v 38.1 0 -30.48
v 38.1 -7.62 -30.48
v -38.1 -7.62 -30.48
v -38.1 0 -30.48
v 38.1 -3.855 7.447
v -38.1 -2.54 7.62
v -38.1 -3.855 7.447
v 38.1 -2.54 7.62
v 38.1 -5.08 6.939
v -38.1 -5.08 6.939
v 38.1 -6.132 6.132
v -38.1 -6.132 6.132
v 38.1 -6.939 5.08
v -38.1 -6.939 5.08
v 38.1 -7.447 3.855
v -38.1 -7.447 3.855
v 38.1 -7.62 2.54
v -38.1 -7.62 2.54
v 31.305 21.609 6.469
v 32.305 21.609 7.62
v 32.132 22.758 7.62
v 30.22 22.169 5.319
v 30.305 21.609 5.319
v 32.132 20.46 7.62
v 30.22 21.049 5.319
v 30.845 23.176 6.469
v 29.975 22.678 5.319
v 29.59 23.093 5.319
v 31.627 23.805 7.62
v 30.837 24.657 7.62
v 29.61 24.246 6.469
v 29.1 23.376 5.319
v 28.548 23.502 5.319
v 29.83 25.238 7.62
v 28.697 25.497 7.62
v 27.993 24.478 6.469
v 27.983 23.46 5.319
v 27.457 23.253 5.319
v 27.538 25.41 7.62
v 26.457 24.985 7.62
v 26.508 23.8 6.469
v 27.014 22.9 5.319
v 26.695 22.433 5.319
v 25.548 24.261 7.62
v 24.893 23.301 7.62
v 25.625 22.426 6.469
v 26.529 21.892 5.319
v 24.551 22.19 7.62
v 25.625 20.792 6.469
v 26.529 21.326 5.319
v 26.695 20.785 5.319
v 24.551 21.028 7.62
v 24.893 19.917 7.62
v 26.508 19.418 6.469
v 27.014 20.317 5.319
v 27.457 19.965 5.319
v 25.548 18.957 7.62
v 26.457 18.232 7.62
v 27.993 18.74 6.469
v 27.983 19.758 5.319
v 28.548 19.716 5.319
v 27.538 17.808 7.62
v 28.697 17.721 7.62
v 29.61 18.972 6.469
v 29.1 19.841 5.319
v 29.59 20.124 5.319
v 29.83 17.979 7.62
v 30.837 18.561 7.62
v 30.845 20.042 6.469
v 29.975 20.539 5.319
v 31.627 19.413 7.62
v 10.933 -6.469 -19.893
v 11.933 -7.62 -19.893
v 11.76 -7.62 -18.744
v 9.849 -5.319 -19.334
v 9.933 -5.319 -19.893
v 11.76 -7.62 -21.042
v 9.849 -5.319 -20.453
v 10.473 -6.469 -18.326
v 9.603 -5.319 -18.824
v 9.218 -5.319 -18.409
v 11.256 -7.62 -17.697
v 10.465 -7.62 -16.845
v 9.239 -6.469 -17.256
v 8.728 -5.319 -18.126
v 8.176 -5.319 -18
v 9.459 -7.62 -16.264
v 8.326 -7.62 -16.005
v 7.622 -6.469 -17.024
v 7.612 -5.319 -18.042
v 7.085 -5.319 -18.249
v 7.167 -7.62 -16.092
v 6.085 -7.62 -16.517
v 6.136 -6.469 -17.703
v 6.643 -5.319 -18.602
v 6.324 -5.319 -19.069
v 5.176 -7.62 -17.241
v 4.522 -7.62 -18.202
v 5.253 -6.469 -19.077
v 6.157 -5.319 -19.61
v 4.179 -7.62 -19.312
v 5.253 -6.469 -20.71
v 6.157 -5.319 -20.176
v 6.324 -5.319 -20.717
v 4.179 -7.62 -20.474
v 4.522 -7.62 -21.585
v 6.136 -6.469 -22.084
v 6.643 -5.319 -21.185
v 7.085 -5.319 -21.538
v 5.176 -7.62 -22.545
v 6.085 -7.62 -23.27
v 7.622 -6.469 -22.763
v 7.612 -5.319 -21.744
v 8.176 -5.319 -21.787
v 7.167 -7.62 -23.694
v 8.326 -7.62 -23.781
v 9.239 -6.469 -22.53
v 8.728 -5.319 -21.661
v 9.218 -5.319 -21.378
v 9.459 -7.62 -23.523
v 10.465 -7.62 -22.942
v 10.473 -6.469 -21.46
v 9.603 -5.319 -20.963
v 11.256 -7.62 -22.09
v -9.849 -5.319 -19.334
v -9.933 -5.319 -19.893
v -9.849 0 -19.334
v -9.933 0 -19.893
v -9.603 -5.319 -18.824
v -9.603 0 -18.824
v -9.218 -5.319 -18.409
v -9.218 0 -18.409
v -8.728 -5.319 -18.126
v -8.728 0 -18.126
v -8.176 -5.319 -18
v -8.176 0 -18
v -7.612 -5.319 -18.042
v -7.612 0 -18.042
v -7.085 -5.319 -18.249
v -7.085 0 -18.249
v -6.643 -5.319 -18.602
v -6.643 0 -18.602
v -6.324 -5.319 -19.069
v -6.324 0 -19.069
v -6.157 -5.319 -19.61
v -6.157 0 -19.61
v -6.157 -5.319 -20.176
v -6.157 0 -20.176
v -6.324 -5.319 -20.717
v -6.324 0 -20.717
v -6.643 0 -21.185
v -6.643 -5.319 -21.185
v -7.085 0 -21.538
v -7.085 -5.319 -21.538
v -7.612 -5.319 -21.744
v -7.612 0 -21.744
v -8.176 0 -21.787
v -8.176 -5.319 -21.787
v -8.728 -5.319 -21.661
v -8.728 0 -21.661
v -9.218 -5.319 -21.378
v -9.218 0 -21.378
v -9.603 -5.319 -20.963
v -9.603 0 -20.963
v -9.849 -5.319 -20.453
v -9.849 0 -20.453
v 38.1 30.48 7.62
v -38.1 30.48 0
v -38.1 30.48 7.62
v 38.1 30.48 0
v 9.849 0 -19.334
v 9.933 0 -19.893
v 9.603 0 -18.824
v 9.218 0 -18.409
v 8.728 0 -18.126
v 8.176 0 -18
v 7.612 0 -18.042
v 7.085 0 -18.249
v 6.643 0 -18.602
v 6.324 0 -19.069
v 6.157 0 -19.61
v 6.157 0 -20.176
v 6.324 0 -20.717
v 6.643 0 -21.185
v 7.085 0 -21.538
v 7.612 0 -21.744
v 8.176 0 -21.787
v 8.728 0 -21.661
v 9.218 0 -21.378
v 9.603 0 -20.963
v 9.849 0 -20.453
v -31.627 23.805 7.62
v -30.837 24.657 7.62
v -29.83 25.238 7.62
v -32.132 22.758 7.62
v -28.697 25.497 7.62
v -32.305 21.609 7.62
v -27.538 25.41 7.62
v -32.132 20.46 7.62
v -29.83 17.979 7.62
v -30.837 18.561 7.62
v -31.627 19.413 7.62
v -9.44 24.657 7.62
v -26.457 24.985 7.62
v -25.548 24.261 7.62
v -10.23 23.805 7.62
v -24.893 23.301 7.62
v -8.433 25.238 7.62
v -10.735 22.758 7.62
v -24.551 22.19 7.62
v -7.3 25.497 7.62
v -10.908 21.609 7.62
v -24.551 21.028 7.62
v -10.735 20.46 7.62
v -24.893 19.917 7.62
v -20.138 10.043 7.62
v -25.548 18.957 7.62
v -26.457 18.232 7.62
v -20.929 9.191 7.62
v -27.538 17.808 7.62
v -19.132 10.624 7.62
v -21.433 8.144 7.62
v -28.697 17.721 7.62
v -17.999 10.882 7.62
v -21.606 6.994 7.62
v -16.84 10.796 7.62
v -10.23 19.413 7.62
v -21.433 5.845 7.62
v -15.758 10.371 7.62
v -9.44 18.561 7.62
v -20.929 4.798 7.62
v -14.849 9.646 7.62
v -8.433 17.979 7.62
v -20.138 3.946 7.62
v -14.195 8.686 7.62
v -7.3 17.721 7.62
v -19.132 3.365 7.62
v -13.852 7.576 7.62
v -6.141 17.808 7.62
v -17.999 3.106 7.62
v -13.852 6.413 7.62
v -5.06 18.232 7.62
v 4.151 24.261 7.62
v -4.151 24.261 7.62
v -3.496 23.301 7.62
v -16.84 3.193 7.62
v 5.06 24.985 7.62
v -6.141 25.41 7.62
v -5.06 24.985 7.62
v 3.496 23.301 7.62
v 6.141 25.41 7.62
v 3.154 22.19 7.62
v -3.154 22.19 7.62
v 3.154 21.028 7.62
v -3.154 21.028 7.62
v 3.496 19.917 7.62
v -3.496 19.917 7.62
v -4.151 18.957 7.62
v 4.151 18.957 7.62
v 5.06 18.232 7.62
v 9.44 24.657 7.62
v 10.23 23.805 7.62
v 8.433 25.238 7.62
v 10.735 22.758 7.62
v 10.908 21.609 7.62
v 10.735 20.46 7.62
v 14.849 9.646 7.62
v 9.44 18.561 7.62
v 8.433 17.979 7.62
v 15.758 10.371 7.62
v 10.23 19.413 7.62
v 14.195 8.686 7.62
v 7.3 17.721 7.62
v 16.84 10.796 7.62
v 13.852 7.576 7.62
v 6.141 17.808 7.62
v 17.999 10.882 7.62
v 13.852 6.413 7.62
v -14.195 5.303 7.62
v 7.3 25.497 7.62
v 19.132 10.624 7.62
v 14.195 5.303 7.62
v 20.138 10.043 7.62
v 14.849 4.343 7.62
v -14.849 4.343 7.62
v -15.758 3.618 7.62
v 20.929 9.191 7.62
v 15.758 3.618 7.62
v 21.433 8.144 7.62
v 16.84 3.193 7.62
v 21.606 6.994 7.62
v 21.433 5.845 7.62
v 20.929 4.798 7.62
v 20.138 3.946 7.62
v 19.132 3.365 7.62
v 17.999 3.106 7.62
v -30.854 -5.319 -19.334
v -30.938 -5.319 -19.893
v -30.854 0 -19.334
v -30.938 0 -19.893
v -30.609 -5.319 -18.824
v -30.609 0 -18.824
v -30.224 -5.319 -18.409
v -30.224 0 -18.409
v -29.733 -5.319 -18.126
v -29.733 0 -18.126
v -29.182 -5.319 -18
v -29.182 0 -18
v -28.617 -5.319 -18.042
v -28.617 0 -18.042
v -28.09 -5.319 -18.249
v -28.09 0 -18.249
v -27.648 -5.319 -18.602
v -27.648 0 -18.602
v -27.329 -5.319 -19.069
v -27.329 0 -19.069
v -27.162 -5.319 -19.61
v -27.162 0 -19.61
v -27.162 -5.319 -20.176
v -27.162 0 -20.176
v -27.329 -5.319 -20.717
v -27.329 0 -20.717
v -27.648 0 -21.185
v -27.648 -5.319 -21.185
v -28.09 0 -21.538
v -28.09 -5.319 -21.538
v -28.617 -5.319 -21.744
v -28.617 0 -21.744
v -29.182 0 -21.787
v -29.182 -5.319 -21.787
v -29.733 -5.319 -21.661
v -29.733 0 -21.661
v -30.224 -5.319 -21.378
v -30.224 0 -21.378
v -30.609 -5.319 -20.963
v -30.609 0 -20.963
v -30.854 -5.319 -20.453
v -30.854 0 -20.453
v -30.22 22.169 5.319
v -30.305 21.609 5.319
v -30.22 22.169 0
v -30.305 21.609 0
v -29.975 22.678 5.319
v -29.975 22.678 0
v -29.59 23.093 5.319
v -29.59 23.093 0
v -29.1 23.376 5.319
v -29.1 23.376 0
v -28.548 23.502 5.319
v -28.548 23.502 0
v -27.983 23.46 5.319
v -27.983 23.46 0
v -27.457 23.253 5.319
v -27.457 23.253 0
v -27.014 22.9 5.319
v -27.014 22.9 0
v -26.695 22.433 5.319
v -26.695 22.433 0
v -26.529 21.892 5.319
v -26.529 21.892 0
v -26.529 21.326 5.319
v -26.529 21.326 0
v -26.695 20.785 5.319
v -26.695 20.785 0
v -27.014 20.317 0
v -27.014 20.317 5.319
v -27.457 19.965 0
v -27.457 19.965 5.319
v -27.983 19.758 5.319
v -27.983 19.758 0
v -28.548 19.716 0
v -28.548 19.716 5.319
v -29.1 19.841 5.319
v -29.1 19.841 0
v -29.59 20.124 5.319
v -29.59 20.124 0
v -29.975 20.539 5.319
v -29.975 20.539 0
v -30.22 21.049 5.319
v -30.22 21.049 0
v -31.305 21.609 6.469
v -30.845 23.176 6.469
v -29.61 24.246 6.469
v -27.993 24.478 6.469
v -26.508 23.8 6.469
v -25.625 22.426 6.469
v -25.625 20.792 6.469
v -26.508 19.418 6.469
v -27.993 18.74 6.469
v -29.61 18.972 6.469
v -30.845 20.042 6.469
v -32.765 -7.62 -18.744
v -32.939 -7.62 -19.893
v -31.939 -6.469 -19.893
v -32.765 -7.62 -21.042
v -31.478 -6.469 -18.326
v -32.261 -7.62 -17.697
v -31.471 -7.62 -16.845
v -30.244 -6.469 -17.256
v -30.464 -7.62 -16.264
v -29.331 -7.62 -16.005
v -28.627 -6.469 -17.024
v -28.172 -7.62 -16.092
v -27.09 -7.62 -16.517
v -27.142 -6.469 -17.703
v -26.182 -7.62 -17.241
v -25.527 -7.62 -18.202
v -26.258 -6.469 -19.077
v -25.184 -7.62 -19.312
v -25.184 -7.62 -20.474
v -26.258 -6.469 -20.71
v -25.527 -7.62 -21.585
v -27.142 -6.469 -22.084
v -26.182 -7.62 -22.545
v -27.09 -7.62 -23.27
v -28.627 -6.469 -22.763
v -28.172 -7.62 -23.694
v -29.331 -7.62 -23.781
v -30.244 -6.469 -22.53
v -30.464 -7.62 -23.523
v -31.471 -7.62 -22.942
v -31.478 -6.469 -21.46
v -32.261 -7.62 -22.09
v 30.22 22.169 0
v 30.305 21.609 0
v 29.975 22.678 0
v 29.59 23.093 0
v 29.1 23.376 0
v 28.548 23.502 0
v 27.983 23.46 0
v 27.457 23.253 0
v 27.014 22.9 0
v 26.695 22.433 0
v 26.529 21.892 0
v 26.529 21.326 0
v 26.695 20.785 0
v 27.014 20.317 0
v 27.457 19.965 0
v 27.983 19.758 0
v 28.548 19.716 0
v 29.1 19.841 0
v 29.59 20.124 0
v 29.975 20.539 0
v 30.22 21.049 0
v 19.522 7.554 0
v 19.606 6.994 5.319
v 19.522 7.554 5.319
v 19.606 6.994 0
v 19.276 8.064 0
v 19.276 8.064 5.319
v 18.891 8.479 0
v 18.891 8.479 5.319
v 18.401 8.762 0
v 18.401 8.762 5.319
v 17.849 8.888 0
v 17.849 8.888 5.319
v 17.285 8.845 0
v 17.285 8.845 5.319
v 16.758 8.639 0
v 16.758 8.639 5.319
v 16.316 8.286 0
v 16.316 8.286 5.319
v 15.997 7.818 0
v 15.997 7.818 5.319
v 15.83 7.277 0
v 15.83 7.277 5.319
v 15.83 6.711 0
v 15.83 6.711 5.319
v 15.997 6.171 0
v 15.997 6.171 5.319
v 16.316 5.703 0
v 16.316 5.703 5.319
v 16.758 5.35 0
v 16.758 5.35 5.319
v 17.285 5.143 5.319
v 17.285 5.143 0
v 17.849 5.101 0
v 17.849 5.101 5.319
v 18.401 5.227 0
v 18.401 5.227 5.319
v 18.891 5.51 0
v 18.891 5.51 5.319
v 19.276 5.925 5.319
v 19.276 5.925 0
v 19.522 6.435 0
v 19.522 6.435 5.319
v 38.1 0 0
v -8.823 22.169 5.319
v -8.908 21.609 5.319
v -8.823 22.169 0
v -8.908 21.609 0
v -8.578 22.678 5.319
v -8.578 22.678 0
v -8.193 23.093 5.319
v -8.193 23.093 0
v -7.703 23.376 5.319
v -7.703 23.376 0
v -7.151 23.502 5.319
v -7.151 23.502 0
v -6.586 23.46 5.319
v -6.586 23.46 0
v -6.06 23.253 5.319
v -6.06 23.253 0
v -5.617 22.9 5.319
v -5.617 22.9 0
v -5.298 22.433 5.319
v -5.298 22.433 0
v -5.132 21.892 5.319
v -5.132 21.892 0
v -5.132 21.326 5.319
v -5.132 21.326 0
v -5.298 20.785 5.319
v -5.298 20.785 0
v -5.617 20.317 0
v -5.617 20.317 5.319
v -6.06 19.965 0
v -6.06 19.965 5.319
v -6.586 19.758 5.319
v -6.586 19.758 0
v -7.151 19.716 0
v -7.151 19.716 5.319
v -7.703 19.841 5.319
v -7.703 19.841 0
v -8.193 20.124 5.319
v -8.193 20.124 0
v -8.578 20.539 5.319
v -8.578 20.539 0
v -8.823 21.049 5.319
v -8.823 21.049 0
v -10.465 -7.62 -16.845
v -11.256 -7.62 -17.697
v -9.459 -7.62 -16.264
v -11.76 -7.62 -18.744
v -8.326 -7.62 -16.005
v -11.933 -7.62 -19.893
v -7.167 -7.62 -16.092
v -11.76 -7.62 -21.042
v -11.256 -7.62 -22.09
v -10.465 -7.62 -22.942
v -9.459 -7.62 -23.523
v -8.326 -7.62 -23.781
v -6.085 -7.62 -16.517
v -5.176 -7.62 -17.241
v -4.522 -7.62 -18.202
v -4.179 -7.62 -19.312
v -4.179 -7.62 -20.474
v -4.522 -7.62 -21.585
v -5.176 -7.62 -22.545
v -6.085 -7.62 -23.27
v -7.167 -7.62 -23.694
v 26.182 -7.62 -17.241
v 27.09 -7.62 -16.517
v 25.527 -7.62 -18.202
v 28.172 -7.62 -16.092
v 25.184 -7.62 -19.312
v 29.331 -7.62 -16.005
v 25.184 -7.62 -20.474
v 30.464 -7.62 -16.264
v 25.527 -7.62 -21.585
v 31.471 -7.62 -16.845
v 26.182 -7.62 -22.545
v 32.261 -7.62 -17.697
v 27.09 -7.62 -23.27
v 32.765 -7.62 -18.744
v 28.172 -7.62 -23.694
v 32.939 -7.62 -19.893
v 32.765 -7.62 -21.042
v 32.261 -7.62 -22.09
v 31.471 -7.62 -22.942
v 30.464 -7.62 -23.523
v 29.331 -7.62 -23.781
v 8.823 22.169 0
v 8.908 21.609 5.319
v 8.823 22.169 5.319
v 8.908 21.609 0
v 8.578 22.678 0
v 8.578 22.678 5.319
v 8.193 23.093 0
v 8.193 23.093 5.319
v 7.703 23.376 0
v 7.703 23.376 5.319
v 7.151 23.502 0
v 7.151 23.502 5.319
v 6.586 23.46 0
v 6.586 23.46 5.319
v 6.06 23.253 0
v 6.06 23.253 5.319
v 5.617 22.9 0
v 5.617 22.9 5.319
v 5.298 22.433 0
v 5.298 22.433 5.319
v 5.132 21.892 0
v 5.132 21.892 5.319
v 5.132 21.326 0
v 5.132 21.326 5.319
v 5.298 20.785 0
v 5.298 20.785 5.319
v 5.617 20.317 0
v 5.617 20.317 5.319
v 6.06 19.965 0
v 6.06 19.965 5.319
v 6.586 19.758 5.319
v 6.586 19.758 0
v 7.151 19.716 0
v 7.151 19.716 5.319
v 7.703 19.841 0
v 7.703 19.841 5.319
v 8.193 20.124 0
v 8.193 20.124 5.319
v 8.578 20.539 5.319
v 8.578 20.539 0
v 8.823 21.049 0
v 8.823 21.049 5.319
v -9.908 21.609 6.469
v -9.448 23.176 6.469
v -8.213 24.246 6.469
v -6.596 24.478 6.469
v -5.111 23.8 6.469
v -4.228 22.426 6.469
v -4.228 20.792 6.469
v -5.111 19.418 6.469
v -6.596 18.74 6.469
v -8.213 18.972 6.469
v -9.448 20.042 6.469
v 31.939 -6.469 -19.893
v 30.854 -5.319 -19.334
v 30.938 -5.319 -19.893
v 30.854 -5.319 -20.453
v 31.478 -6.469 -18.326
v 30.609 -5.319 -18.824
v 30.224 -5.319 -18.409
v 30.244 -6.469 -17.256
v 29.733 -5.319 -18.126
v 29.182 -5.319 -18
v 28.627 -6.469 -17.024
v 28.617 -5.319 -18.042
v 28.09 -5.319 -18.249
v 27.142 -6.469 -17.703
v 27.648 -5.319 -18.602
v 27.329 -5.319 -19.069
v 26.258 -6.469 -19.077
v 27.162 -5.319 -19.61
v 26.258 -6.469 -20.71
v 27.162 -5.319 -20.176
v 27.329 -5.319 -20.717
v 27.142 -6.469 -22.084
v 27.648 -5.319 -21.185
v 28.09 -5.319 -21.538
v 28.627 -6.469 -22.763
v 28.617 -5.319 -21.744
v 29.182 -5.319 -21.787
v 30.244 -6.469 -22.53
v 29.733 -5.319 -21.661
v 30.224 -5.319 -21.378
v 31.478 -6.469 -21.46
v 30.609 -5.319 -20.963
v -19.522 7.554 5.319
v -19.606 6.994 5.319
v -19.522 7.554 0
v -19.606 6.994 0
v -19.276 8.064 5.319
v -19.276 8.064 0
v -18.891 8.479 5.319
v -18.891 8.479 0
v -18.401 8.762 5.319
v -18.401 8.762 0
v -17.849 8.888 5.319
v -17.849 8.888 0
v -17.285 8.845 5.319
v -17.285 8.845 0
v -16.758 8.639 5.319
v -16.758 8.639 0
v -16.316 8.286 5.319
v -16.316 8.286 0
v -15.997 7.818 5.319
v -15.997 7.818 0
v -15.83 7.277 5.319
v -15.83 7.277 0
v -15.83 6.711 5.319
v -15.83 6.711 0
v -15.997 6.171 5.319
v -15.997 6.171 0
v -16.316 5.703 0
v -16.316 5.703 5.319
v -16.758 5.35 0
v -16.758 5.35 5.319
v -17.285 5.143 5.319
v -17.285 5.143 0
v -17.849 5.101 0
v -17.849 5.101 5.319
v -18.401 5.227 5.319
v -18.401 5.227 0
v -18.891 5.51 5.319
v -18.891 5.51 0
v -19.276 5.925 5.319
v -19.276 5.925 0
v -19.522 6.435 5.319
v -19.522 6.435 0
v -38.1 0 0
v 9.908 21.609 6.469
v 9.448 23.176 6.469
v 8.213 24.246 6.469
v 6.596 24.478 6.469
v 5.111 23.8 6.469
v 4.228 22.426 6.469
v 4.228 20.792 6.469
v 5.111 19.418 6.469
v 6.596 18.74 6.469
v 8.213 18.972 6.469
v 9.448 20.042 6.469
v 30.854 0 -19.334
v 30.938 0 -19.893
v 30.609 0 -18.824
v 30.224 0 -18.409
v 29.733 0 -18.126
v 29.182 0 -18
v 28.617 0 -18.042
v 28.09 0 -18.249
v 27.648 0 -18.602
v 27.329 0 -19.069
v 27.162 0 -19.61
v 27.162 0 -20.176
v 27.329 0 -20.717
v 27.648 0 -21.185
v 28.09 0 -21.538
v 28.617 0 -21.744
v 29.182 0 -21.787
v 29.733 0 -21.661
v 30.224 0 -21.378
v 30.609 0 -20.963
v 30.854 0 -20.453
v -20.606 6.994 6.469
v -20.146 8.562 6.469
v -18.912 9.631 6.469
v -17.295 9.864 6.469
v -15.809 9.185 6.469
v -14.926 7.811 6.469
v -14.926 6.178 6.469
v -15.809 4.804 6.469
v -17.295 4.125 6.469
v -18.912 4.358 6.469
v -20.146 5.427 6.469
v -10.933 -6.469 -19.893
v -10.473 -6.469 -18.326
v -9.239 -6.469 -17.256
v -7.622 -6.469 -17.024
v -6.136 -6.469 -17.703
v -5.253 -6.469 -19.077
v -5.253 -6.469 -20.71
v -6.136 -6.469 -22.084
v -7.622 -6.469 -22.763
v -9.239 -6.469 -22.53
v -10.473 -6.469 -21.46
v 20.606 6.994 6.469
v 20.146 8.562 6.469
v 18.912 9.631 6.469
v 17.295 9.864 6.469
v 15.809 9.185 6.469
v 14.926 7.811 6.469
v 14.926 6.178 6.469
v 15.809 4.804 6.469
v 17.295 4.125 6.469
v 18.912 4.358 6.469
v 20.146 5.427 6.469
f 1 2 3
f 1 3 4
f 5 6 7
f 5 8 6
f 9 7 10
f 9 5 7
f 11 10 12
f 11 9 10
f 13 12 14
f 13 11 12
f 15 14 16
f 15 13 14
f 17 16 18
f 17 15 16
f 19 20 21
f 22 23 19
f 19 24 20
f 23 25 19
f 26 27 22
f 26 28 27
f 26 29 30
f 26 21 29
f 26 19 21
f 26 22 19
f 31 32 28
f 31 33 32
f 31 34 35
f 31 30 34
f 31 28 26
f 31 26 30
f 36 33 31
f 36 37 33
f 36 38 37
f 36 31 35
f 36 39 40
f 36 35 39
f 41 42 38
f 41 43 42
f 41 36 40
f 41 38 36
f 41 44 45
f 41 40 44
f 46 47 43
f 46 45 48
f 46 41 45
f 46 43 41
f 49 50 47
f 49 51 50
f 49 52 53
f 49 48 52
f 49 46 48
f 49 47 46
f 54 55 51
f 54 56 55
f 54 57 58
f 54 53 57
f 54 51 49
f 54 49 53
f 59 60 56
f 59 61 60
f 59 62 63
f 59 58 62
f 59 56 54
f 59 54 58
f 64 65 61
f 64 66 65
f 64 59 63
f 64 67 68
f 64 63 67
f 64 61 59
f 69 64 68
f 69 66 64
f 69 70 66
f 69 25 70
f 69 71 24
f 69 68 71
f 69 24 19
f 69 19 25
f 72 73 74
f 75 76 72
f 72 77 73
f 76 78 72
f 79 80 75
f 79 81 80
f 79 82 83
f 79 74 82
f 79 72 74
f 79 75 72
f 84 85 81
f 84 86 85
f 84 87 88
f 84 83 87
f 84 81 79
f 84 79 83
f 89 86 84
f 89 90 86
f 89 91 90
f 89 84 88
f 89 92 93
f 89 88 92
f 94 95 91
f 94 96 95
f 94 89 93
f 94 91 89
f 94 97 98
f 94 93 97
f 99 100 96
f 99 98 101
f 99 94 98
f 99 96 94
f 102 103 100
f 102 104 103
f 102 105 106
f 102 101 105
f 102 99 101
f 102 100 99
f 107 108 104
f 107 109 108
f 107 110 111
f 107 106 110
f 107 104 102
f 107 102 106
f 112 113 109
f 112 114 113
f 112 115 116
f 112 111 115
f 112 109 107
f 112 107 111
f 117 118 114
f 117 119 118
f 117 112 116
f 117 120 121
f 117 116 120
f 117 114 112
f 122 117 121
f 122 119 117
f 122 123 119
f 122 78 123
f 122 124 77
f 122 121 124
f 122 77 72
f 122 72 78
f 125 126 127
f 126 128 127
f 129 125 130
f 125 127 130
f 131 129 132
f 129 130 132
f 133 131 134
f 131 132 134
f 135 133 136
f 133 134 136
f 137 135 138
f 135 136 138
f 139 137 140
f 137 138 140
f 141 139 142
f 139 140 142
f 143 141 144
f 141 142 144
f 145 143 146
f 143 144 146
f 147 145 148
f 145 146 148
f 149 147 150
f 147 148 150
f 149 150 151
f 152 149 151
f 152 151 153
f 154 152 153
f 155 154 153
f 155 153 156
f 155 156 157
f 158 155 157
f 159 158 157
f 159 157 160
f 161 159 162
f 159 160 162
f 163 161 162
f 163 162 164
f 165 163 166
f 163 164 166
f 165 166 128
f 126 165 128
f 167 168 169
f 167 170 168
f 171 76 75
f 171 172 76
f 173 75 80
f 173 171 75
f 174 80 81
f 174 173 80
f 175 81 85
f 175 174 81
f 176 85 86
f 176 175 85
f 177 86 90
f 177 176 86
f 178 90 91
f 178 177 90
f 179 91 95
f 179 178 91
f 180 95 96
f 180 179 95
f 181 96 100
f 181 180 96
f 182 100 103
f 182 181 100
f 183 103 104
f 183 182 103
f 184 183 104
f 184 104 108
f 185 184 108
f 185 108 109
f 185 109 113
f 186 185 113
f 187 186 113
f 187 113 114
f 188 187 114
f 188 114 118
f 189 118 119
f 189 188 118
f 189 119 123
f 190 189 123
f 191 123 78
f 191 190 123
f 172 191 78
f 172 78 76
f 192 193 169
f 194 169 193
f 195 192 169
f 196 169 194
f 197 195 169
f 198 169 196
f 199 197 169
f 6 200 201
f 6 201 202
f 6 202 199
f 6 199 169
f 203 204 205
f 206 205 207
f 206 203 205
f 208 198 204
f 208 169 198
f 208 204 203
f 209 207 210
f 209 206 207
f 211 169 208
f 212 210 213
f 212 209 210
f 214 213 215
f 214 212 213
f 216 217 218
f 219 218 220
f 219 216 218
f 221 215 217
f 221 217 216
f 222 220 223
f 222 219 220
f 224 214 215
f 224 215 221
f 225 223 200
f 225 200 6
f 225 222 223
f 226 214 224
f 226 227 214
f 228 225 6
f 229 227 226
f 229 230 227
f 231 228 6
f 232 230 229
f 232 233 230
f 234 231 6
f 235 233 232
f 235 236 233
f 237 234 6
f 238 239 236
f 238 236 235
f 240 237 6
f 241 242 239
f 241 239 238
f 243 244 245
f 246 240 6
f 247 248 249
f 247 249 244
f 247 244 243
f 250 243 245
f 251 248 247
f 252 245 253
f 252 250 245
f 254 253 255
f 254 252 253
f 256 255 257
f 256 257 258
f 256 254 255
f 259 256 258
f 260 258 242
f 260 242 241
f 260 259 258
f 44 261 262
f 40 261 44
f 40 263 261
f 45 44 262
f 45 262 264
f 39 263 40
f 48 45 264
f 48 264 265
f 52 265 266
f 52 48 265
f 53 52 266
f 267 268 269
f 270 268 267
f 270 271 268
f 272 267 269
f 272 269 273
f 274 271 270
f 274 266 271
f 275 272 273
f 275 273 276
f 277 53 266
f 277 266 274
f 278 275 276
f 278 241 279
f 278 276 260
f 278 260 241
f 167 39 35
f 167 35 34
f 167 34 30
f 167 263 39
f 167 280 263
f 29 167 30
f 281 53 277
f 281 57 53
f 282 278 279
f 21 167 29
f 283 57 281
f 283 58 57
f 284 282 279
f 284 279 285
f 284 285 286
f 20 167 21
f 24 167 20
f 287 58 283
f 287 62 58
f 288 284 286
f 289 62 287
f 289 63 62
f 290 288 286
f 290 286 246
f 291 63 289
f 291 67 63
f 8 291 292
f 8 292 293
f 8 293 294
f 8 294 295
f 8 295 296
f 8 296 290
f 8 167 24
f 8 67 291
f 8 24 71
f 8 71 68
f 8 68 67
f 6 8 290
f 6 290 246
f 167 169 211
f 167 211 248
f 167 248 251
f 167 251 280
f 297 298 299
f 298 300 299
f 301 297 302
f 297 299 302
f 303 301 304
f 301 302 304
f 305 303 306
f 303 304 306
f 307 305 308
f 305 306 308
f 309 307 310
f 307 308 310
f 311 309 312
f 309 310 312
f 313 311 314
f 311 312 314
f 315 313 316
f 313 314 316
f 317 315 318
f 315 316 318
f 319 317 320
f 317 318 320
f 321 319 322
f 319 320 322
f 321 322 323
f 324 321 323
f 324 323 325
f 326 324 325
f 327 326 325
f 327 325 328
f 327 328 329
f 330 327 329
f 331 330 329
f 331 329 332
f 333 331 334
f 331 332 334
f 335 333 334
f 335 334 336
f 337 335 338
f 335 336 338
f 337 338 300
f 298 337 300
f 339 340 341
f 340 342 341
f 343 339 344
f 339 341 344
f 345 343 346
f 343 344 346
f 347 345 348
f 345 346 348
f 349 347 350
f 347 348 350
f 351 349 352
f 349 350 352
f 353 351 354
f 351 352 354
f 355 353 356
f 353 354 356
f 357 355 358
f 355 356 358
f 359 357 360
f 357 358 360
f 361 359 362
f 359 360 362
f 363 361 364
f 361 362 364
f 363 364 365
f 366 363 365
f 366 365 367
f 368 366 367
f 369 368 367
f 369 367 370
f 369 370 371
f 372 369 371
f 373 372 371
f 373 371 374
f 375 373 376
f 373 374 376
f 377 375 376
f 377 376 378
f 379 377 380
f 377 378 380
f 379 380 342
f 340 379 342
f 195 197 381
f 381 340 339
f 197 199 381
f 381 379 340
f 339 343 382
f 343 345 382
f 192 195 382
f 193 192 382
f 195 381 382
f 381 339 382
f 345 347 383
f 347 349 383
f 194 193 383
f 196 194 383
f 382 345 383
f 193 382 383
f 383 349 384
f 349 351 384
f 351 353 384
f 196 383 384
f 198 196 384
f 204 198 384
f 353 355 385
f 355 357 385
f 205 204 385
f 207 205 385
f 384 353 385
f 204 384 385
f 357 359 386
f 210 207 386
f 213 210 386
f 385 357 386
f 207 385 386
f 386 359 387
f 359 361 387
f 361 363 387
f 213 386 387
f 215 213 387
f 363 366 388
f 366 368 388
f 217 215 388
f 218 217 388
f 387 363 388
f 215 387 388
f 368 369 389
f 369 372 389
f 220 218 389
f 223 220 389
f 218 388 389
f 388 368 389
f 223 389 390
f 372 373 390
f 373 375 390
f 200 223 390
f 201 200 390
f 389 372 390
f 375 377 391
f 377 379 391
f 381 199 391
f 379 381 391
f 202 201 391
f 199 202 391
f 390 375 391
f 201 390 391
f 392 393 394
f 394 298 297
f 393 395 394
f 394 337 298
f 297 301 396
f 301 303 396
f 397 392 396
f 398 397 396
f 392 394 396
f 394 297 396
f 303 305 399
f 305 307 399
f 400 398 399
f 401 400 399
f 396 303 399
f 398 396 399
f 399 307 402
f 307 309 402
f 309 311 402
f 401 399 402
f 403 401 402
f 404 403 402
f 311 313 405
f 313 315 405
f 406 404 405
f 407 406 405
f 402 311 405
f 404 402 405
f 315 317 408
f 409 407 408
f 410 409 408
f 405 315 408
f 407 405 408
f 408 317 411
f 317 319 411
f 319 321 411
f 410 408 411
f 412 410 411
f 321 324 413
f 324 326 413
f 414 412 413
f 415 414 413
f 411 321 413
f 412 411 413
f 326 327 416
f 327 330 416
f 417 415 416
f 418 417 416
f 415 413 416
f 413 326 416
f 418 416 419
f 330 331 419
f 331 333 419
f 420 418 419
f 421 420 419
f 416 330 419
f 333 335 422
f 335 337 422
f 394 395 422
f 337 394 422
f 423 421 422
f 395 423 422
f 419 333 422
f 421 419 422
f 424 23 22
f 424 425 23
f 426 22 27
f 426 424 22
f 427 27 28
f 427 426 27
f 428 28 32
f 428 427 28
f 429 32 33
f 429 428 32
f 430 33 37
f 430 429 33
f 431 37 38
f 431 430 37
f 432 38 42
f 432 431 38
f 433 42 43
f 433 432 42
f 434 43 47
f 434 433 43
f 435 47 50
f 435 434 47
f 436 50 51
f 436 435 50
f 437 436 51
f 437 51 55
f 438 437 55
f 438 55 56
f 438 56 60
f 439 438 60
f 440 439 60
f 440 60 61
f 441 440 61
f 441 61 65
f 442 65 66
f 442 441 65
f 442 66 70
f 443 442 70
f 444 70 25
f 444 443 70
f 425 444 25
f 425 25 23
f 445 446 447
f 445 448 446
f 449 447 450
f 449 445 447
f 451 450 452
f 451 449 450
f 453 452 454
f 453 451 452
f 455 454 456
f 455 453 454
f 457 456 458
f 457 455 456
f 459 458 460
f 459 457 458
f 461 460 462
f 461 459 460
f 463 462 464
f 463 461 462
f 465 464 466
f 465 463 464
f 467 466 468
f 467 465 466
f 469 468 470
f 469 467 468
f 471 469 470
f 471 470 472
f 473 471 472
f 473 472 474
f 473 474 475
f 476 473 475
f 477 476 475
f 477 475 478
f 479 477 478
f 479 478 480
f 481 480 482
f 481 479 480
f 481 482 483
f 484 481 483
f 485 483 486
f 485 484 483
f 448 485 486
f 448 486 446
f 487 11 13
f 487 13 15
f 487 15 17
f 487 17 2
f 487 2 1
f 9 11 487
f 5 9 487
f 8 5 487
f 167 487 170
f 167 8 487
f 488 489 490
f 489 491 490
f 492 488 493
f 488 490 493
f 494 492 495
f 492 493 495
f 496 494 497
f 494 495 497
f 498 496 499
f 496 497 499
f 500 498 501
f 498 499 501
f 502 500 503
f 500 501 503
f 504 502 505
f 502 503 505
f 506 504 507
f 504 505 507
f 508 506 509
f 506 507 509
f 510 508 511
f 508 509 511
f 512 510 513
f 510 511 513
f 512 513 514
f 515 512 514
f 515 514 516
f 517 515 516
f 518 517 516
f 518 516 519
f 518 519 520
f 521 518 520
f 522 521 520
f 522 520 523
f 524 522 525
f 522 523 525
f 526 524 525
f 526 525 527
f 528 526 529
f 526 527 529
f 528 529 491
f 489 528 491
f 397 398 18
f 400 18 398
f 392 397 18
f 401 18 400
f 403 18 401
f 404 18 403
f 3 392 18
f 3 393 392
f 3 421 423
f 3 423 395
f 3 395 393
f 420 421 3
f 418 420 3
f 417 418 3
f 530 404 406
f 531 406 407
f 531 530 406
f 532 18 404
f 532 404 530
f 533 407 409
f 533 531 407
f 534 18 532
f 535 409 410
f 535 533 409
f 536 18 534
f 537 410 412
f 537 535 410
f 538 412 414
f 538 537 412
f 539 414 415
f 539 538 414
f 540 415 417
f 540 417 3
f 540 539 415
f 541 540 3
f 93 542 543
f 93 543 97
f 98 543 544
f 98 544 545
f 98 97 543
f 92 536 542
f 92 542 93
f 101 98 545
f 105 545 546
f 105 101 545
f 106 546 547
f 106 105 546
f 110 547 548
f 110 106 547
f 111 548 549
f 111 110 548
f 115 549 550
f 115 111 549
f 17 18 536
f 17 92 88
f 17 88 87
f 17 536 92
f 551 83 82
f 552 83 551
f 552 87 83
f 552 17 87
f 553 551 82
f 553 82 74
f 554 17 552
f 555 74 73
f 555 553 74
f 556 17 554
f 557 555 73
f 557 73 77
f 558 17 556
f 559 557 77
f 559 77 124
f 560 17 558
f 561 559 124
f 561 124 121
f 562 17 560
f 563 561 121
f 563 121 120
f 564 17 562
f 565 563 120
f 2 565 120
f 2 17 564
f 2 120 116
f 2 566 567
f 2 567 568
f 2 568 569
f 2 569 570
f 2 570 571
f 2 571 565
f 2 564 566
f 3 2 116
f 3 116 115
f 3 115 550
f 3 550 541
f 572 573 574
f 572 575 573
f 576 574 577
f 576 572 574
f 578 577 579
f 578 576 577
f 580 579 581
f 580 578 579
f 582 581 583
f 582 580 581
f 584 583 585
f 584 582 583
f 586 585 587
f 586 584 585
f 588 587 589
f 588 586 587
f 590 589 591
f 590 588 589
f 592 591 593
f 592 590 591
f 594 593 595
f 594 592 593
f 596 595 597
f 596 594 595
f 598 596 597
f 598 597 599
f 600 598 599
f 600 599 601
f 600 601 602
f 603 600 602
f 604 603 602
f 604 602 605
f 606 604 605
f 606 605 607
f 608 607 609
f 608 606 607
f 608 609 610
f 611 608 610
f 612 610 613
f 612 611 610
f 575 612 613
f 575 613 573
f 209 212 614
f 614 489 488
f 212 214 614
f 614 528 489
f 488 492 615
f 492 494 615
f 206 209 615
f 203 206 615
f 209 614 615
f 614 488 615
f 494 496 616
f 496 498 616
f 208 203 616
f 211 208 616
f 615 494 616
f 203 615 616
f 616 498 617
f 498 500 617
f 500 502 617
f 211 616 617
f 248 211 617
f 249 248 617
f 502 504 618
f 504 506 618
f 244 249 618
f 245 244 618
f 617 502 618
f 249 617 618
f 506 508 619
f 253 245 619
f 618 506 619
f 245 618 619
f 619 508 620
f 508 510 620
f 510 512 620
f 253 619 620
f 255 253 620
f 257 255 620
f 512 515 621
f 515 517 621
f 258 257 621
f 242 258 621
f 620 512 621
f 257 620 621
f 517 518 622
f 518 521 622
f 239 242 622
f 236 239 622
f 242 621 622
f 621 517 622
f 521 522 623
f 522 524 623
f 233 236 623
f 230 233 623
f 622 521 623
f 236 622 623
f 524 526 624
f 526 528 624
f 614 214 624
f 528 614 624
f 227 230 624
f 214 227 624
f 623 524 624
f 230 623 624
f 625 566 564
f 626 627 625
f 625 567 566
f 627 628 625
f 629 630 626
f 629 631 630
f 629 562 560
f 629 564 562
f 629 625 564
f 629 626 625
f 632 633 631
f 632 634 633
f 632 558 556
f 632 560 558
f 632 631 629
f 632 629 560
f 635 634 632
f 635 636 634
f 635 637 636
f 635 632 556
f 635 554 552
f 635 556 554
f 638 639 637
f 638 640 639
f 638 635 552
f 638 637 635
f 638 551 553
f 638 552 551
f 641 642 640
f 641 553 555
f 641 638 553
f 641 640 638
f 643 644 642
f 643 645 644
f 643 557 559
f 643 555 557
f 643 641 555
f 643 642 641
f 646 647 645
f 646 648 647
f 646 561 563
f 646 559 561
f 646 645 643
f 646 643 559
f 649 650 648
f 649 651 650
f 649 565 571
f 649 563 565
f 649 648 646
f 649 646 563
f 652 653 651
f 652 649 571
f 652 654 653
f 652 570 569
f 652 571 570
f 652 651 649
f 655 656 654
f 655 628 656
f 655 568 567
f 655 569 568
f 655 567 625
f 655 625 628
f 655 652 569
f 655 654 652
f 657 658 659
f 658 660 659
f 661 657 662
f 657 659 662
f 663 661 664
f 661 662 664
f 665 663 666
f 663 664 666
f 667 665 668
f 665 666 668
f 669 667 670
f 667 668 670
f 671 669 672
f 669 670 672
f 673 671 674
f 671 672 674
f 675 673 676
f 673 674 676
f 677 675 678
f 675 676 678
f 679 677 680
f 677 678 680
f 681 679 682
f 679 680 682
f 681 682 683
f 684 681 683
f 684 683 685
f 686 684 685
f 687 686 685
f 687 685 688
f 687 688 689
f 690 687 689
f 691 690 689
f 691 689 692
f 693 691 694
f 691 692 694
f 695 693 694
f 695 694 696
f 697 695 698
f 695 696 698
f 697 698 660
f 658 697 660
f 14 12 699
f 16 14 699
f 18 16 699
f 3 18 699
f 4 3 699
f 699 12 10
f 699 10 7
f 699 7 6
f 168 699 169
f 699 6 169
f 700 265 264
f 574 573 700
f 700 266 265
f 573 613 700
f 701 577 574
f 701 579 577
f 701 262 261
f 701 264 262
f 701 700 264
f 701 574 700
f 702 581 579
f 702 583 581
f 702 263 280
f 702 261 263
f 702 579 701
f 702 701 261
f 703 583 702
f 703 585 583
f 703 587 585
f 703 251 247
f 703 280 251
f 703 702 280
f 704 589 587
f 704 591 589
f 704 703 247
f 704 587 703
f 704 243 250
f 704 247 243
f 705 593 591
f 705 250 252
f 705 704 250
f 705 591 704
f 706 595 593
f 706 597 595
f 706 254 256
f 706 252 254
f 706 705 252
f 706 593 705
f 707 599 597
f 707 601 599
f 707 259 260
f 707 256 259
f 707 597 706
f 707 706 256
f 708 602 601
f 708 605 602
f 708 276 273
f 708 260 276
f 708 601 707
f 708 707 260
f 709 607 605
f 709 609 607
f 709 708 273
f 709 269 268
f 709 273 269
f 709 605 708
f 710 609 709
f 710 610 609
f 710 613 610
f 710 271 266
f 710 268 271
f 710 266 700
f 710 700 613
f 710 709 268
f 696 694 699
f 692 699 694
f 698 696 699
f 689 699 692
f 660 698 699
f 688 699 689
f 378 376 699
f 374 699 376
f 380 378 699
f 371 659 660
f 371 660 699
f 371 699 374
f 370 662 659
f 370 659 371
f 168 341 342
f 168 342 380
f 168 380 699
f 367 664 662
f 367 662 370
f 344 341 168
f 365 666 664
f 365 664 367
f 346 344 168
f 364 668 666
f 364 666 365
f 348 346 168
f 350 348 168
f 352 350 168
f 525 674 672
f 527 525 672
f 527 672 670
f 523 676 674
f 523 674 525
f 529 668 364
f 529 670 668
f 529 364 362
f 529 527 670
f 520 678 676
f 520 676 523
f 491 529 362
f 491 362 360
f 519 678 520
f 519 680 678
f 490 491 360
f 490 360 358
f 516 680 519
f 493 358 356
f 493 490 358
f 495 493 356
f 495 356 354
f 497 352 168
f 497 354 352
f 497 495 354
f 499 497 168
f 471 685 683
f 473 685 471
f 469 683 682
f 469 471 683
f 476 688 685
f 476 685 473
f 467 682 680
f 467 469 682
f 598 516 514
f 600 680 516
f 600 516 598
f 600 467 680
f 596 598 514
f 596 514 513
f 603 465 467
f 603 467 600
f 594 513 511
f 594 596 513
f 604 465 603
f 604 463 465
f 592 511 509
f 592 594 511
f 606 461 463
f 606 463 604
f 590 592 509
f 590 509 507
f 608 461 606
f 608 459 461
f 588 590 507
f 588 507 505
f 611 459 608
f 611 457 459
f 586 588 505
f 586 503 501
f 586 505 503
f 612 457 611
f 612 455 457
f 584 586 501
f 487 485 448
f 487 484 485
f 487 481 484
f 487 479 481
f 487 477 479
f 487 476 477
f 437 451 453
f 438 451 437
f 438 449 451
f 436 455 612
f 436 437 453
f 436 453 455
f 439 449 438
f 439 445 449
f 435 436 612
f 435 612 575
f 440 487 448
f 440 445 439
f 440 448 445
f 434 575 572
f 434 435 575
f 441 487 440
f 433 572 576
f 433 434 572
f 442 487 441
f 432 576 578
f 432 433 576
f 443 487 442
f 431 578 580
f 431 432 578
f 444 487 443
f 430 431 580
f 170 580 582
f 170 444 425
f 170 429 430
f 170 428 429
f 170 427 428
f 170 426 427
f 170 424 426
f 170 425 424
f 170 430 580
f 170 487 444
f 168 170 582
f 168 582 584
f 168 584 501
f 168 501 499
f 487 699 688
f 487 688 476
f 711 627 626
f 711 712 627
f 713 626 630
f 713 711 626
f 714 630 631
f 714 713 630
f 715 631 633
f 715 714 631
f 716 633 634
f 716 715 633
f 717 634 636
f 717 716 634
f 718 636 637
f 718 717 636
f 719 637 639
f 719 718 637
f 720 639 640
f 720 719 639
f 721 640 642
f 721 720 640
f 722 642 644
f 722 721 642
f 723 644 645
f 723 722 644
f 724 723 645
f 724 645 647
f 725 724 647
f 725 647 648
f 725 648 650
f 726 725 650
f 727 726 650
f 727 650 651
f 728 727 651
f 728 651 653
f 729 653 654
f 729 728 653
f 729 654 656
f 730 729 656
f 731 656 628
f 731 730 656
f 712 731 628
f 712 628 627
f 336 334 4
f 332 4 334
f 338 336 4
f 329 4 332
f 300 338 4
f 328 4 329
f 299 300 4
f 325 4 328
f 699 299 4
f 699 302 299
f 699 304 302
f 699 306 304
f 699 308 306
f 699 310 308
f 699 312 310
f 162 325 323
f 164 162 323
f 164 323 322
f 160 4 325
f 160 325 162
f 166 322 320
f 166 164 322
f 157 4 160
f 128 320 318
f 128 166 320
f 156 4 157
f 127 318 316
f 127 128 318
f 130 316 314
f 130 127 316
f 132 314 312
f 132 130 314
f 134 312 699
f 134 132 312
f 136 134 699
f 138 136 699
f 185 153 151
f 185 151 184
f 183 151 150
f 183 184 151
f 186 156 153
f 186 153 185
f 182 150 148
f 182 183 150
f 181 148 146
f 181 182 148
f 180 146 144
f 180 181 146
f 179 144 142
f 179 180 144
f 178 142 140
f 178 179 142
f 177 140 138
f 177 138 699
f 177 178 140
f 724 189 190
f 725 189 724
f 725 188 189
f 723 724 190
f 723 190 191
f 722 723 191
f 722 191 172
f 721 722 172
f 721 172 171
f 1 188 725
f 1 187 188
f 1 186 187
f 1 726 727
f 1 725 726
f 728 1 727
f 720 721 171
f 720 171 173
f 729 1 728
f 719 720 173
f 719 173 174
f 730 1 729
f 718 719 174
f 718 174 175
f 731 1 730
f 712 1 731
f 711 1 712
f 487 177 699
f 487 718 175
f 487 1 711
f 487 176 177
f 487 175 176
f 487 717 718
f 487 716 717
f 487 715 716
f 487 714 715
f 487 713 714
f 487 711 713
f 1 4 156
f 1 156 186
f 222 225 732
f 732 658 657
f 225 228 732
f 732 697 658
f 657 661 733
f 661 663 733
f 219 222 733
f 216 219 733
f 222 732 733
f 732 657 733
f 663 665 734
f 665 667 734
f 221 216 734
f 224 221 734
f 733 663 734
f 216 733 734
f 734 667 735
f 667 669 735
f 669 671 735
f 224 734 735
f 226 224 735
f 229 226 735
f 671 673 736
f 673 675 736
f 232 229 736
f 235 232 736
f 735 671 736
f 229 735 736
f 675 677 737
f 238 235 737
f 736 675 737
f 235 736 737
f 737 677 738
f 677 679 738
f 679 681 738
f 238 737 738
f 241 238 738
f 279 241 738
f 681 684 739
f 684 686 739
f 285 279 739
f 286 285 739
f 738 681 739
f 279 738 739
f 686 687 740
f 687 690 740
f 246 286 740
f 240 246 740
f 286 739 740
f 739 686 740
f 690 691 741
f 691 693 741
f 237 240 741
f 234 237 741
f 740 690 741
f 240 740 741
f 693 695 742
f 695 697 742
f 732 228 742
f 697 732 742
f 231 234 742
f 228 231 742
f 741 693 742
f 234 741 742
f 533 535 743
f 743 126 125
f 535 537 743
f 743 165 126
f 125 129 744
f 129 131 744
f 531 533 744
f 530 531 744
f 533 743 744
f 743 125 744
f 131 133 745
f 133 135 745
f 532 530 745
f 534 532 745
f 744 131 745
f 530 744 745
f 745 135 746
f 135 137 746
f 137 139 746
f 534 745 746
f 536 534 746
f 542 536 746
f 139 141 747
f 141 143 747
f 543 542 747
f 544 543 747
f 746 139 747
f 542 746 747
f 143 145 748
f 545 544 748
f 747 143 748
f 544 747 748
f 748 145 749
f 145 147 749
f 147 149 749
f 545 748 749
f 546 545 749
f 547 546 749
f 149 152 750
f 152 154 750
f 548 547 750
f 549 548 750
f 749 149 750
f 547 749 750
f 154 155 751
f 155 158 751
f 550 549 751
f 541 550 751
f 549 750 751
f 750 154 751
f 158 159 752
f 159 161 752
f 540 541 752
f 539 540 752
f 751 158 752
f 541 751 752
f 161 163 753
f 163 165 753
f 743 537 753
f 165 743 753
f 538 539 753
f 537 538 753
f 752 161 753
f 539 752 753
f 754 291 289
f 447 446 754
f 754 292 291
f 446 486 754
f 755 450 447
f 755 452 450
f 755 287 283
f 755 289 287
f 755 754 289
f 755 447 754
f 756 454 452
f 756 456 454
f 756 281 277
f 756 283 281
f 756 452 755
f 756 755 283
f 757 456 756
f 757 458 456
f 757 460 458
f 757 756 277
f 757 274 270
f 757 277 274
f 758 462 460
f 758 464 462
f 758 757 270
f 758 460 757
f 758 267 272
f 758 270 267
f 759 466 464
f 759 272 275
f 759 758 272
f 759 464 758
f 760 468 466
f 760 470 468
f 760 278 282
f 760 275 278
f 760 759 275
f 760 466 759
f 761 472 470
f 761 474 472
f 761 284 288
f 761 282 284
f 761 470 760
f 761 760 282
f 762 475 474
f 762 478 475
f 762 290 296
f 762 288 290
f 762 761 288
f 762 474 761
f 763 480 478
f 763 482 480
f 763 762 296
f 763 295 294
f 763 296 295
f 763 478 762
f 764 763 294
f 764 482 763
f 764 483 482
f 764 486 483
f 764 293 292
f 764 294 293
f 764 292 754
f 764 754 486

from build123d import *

# Parameters (mm, degrees)
F1_DEPTH       = 38.1
F3_D           = 3.7973
F3_CSINK_D     = 7.7978
F3_CSINK_ANGLE = 82
F4_R           = 5.08
F6_D           = 3.7973
F6_CSINK_D     = 7.7978
F6_CSINK_ANGLE = 82


# Not quite as in the source:
# - a pattern or mirror of a feature is missing from the dataset's text; its kind, count and spacing are read off the source's solid


with BuildPart() as f1:
    # F0 (on Right) → F1 (new body, symmetric)
    with BuildSketch(Plane.YZ):
        Polygon((30.48, 7.62), (-7.62, 7.62), (-7.62, -30.48), (0, -30.48), (0, 0), (30.48, 0), align=None)
    extrude(amount=F1_DEPTH, both=True)

    # F3 (through all)
    with Locations(Plane.XY.offset(7.62)):
        with Locations((-28.405956924, 21.6088658199), (-7.0089674555, 21.6088658199), (-17.7074621897, 6.9944329099)):
            f3 = CounterSinkHole(F3_D / 2, F3_CSINK_D / 2, counter_sink_angle=F3_CSINK_ANGLE)

    # F3_copies: F3 across plane
    add(f3.mirror(Plane(origin=(0, 0, 0), x_dir=(0, 0, 1), z_dir=(1, 0, 0))), mode=Mode.SUBTRACT)

    # F4
    f4_edges = [f1.edges().sort_by_distance(p)[0] for p in [
        (0, -7.62, 7.62),
    ]]
    fillet(f4_edges, radius=F4_R)

    # F6 (through all)
    with Locations(Plane.XZ.offset(7.62)):
        with Locations((-8.0344257876, -19.893276193), (-29.0398038924, -19.893276193)):
            f6 = CounterSinkHole(F6_D / 2, F6_CSINK_D / 2, counter_sink_angle=F6_CSINK_ANGLE)

    # F6_copies: F6 across plane
    add(f6.mirror(Plane(origin=(0, 0, 0), x_dir=(0, 0, 1), z_dir=(1, 0, 0))), mode=Mode.SUBTRACT)


solid = f1.part
